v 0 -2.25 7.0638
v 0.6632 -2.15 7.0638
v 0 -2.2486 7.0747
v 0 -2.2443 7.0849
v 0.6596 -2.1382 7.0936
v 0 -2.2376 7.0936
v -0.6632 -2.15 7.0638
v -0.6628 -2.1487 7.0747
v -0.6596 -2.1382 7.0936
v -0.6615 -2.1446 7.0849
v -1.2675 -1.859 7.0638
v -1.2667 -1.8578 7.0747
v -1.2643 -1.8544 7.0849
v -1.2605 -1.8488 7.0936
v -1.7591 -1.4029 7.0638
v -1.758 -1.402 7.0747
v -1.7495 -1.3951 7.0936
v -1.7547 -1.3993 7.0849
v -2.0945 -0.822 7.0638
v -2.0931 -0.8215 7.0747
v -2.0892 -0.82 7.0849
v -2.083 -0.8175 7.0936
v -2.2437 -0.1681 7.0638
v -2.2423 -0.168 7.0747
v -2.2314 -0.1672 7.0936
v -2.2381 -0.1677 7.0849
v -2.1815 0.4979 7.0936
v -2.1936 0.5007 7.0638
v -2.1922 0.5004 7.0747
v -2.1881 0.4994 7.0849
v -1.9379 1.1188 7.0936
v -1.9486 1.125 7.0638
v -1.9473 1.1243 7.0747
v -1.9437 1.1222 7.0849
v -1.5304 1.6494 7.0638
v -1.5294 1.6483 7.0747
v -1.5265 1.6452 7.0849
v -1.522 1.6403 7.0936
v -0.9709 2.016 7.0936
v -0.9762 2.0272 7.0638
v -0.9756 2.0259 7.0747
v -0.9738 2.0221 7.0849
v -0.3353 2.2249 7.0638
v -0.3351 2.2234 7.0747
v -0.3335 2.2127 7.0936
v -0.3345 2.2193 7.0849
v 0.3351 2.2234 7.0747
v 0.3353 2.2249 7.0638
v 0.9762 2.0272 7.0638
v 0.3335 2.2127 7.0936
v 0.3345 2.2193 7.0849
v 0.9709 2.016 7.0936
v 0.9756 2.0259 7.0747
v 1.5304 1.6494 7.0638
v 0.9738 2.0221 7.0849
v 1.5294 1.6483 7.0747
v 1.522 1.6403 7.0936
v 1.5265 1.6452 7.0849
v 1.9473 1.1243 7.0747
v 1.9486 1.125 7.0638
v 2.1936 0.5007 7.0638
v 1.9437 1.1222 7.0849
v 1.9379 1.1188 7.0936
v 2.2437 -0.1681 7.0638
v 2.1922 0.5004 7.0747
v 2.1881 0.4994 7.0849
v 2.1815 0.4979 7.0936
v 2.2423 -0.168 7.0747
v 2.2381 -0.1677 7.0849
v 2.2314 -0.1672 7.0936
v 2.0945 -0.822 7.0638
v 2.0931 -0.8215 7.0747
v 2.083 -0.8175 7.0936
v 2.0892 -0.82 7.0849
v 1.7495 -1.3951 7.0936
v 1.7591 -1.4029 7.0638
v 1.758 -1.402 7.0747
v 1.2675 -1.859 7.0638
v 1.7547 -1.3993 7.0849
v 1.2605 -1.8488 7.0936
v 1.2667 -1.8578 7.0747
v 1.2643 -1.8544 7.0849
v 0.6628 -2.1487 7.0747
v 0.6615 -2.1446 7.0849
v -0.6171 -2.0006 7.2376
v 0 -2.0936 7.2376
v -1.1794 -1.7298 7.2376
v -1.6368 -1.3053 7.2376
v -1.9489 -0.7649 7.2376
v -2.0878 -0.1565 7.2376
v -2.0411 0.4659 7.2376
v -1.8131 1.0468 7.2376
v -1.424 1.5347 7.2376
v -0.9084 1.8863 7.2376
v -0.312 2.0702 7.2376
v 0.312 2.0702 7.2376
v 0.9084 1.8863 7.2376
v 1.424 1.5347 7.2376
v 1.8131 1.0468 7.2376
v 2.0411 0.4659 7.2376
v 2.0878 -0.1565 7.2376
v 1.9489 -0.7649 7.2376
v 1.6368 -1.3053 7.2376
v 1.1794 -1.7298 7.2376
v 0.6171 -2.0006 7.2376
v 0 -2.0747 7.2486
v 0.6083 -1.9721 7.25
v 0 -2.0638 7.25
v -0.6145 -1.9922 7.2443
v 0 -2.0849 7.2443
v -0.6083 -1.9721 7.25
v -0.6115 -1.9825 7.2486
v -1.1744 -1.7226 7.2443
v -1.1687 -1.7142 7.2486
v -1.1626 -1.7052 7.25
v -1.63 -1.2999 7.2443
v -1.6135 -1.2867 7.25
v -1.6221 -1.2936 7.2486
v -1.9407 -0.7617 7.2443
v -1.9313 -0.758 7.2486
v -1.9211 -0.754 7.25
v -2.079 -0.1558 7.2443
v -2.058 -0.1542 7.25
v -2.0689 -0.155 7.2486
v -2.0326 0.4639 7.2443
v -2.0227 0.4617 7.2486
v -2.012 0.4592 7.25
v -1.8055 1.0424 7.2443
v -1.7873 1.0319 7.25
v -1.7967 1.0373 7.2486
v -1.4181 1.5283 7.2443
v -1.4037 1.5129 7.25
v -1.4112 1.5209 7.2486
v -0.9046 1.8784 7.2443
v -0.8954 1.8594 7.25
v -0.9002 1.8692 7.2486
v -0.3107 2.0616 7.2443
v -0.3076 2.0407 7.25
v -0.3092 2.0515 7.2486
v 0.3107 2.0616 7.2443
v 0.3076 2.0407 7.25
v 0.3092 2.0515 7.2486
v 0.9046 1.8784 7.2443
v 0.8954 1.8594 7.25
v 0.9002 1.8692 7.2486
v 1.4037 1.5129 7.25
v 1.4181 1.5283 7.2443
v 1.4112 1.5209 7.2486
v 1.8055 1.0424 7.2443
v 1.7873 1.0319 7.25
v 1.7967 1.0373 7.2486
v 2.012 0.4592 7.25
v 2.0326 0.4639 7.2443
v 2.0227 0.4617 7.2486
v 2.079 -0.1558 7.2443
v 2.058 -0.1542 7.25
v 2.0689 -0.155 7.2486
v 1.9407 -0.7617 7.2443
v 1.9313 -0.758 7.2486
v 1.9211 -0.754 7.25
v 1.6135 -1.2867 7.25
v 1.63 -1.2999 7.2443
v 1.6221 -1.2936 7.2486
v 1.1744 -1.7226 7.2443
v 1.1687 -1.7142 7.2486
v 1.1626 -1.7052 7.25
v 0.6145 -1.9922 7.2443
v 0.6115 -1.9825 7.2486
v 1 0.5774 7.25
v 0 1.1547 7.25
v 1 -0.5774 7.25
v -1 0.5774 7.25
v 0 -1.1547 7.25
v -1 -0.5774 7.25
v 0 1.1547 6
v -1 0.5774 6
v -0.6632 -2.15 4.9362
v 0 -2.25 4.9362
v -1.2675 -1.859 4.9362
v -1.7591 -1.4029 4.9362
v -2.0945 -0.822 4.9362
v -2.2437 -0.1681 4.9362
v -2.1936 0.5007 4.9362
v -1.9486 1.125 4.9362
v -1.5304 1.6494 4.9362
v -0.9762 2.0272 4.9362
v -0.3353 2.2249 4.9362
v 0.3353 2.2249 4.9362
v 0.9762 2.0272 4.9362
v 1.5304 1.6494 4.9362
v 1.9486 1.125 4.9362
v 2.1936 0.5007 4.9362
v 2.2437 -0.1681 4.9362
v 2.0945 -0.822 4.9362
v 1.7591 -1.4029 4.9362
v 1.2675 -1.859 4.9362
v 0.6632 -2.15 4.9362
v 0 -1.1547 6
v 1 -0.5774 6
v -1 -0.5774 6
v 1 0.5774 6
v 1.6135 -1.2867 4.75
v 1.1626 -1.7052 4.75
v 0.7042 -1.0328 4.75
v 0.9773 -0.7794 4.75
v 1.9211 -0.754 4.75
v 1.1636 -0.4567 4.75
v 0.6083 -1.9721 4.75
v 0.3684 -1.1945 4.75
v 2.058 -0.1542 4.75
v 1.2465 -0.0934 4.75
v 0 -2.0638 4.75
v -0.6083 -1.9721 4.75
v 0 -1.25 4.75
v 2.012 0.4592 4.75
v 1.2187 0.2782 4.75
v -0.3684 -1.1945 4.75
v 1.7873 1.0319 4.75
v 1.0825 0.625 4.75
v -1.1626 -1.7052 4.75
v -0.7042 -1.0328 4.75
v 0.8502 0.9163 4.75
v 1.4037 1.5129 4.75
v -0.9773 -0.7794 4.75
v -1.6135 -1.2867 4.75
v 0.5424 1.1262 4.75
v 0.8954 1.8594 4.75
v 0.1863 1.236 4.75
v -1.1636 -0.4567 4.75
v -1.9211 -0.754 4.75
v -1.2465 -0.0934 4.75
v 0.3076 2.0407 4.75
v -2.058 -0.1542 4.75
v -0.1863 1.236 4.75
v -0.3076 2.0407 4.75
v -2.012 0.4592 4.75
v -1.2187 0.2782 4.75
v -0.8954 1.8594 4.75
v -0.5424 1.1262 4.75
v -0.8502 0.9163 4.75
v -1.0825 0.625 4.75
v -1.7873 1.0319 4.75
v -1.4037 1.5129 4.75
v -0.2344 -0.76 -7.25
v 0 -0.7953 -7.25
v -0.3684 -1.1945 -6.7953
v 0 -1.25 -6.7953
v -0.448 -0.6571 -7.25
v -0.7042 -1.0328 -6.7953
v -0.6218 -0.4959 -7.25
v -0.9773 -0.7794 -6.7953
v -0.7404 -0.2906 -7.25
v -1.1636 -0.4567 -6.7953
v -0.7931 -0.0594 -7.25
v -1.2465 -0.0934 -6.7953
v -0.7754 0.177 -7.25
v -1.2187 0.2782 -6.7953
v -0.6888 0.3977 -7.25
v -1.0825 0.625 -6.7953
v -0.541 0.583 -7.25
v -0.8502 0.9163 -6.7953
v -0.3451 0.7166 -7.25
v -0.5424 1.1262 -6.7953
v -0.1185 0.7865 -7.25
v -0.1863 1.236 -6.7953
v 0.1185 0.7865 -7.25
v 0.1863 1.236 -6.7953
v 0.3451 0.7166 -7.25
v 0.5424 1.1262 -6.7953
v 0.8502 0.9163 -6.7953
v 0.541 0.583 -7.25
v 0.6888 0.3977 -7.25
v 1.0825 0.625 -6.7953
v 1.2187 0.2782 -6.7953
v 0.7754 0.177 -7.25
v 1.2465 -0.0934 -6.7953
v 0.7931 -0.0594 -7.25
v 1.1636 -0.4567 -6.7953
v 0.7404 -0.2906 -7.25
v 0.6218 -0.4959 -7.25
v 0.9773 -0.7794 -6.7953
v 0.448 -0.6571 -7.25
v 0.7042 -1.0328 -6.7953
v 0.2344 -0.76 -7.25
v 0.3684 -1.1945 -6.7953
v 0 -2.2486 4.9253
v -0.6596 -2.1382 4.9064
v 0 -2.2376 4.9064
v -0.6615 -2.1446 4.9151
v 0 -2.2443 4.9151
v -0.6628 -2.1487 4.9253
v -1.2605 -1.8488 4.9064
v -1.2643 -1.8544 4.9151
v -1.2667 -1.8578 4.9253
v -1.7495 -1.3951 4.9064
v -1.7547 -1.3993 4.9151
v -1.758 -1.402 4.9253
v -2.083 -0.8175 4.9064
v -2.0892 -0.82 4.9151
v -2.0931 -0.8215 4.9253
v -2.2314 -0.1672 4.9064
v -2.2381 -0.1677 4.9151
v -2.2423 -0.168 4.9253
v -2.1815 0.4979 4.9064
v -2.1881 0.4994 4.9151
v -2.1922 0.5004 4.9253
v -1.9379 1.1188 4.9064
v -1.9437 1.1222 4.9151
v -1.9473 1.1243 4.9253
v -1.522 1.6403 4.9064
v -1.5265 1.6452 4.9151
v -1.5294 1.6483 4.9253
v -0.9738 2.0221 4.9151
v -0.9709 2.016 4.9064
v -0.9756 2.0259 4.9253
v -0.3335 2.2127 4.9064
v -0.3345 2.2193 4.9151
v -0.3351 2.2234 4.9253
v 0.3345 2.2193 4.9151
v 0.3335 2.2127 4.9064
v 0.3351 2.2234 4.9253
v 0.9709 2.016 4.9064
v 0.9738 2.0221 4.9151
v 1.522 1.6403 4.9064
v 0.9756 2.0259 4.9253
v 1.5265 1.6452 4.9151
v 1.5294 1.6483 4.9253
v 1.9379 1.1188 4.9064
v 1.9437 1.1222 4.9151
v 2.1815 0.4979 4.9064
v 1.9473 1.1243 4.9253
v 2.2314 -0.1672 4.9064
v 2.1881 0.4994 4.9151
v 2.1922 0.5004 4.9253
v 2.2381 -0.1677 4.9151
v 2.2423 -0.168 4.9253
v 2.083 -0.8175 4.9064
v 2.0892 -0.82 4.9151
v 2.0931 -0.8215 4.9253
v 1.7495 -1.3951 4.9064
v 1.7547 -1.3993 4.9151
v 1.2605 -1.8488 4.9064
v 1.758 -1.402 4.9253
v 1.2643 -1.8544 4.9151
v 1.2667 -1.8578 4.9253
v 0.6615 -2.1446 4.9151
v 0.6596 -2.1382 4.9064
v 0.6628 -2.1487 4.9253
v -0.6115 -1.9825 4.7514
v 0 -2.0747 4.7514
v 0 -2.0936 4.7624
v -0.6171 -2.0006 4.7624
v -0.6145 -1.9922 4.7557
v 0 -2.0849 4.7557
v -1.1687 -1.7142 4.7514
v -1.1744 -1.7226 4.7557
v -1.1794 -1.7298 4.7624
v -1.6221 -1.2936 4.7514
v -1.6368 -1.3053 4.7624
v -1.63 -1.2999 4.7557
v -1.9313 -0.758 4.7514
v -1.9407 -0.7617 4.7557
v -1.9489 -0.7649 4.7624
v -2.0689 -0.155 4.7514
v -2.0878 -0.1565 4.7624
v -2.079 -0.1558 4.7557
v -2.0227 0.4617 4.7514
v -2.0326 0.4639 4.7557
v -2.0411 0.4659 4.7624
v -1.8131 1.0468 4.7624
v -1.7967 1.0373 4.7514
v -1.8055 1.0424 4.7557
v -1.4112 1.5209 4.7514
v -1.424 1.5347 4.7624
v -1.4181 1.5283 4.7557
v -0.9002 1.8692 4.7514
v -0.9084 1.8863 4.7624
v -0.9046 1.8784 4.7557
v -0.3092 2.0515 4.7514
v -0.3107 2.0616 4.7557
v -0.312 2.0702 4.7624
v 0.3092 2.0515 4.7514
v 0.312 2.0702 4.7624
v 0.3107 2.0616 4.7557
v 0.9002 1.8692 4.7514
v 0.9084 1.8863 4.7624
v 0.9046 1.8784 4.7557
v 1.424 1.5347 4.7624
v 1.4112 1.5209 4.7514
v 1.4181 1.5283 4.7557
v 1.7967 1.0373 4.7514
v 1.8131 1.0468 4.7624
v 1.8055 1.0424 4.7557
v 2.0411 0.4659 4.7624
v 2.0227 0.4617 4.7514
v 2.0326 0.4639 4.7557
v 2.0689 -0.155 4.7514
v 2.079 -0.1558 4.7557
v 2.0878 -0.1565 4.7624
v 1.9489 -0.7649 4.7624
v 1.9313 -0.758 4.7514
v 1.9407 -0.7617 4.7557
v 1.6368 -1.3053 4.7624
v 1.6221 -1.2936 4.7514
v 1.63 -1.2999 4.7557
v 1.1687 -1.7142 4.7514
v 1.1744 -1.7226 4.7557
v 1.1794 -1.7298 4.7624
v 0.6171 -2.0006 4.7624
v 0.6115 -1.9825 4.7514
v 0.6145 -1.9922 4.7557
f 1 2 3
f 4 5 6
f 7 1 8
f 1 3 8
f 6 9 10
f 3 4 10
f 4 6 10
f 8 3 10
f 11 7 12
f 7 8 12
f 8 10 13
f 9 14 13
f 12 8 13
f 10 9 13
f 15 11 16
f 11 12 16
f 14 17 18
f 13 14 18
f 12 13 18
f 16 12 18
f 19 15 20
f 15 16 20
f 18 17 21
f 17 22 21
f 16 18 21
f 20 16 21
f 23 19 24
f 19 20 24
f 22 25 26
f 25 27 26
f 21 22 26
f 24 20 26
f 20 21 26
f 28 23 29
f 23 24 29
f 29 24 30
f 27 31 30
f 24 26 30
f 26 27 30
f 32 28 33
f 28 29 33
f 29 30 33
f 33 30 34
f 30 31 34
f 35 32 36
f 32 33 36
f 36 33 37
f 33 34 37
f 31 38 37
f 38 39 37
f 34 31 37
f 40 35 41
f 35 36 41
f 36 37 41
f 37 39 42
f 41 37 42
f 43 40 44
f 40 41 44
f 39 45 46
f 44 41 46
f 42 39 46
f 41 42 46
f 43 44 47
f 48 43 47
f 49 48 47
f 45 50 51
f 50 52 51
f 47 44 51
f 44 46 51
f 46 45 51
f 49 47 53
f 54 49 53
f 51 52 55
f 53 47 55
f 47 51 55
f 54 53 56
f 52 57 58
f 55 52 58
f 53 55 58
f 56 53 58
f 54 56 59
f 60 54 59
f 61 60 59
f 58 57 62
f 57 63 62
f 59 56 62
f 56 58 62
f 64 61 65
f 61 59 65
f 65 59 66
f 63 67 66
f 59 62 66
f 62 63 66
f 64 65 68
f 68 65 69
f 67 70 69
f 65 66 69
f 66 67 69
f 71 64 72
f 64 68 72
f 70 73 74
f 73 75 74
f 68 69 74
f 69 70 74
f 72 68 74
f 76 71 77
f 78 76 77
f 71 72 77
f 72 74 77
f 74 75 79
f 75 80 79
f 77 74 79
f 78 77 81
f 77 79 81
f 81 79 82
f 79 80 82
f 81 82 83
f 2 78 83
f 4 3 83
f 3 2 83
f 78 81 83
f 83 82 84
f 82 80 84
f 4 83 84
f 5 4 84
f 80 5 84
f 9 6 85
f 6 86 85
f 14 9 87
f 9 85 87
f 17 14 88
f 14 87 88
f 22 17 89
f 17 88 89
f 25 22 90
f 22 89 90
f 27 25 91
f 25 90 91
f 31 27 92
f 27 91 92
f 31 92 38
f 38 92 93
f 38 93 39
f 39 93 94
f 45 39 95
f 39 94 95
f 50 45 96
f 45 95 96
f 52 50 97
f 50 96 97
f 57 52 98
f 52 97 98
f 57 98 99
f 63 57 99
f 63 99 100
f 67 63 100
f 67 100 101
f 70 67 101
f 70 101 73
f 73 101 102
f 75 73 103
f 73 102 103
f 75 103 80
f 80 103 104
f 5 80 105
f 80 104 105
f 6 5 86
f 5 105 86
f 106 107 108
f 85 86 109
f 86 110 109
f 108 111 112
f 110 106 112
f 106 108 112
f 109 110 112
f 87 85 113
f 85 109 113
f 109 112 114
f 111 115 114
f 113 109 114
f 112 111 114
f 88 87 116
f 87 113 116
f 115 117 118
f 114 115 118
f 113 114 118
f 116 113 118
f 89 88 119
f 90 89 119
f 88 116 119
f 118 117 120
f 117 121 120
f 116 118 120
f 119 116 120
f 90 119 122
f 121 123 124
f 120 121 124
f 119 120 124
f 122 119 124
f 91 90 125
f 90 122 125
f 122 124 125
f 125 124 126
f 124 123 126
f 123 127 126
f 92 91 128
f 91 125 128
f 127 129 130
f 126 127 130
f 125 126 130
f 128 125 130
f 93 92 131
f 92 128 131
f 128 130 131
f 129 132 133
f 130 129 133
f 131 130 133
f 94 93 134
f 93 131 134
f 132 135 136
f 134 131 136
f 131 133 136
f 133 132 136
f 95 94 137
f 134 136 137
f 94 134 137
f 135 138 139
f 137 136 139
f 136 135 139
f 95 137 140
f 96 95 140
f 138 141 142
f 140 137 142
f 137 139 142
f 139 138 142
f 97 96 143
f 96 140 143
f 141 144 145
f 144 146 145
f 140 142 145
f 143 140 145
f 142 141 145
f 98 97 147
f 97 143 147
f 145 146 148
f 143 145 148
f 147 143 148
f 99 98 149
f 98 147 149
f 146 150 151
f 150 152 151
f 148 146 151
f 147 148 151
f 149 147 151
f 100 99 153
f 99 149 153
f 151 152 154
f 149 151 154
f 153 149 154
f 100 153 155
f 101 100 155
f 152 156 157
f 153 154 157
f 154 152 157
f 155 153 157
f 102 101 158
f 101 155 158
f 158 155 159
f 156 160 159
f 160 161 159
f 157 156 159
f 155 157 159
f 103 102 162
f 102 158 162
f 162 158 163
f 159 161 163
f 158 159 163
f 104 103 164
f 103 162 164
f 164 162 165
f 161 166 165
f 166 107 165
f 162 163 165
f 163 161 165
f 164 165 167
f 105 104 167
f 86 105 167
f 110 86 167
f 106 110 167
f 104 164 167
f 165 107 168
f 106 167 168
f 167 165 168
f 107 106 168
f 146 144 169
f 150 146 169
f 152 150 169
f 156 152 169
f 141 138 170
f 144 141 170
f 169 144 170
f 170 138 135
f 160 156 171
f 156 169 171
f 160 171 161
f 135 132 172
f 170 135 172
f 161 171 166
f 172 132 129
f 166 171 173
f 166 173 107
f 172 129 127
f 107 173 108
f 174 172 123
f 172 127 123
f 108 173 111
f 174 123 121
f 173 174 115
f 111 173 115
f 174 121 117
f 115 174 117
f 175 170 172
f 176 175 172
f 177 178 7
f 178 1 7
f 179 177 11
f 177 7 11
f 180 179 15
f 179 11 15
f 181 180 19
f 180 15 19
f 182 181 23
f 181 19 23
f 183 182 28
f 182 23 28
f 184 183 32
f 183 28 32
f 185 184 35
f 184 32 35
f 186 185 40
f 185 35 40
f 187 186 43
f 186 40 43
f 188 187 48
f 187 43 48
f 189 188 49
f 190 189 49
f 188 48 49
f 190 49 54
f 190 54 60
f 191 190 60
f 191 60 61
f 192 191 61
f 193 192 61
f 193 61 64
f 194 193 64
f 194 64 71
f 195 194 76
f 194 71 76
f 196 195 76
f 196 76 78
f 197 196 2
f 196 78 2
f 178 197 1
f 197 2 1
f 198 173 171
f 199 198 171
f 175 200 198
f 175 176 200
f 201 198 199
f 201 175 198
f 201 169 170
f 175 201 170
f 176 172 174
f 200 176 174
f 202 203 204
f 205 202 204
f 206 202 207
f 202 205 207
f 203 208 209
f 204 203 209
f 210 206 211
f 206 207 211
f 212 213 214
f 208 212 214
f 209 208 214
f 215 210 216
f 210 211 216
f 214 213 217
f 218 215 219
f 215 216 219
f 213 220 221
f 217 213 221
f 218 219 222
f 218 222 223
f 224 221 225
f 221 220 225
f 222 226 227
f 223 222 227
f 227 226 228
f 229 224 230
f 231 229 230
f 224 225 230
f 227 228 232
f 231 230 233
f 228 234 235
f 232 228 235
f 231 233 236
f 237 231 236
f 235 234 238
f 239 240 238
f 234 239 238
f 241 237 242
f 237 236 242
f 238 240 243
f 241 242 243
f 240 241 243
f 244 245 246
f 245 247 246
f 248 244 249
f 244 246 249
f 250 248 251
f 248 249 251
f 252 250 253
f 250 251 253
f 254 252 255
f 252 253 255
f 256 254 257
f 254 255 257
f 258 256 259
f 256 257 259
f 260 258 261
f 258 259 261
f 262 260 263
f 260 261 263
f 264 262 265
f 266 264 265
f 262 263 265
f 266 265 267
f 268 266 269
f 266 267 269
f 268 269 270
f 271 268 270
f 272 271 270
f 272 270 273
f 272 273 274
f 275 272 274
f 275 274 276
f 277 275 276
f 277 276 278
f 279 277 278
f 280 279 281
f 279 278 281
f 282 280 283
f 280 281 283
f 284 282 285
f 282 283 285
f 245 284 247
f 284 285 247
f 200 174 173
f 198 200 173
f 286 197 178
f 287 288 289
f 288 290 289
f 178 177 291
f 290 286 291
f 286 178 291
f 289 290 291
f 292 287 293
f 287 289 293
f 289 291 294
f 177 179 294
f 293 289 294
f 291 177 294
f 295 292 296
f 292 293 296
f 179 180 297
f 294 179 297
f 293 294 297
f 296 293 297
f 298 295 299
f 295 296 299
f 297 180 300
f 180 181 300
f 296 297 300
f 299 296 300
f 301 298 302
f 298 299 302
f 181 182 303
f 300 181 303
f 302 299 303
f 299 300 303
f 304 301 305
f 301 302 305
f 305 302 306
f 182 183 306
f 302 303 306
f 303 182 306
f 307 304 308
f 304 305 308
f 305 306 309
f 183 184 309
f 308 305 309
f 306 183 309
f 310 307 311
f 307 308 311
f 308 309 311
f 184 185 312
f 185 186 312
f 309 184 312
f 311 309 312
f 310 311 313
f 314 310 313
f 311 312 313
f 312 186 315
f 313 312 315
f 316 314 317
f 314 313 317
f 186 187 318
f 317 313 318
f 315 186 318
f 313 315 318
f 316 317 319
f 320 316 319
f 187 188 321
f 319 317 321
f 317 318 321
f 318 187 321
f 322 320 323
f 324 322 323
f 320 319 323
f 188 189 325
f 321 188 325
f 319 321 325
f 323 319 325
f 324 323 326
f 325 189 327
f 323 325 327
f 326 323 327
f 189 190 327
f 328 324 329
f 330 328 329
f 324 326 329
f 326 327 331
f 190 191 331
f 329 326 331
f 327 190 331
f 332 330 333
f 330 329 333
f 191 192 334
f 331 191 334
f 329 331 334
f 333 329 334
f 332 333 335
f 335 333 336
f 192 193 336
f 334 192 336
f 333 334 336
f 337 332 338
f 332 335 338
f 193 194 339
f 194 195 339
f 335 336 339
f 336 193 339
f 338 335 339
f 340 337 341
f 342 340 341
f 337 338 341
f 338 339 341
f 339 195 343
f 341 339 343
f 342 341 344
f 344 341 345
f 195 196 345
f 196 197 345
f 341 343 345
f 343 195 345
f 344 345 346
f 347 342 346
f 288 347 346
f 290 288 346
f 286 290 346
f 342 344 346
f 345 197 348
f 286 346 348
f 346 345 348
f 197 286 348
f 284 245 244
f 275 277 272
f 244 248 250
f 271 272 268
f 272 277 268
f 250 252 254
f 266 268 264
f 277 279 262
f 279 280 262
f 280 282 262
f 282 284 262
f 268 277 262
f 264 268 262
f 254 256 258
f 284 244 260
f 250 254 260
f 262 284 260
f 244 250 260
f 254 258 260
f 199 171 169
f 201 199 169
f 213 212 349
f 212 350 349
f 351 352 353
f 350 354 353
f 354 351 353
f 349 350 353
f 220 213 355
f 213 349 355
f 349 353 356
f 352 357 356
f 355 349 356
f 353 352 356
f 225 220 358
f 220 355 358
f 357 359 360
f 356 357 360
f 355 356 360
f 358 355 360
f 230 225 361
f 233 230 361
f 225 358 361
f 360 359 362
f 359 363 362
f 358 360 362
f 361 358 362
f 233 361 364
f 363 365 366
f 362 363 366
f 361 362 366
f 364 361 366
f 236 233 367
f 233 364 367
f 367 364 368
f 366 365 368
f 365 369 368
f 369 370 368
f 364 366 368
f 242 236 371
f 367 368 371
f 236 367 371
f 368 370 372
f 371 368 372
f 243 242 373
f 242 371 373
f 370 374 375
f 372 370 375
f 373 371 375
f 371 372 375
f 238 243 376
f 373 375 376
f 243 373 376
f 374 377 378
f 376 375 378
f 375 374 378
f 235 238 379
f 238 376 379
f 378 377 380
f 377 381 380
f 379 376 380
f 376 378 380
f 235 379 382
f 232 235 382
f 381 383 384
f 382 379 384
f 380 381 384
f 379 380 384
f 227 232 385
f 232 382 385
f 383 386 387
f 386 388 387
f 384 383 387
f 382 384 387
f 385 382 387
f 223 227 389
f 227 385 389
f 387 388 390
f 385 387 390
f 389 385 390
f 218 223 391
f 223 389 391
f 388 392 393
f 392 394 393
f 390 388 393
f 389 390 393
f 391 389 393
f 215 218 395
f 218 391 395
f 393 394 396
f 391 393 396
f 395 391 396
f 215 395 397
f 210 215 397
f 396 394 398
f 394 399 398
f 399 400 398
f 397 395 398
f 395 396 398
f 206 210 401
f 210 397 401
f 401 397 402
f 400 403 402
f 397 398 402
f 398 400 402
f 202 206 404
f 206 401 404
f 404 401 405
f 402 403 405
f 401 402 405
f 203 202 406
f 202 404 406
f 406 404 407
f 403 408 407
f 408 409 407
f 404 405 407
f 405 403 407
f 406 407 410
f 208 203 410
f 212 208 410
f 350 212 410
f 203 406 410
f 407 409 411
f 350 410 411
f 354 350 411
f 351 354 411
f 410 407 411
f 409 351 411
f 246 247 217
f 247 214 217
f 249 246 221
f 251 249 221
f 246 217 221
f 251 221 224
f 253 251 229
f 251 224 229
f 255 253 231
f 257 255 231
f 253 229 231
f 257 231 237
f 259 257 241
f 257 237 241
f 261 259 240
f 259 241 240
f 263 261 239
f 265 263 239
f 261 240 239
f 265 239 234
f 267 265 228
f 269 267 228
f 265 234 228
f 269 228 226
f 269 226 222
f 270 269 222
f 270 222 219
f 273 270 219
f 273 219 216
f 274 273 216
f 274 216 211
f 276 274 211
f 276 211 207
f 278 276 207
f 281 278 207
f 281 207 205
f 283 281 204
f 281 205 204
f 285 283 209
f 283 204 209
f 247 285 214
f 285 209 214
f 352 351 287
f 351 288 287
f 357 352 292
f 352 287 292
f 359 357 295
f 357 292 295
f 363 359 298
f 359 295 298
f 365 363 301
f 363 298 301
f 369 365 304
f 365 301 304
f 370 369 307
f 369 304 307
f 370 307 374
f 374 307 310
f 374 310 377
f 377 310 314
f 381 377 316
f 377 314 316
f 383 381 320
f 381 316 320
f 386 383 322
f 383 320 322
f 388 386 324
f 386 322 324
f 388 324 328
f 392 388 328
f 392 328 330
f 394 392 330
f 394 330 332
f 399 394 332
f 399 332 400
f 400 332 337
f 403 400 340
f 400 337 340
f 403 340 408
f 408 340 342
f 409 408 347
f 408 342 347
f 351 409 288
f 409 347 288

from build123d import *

# Parameters (mm, degrees)
CUT_EXTRUDE1_DEPTH = 1.25


with BuildPart() as part:
    # Sketch3 → Revolve1 (revolve)
    with BuildSketch(Plane(origin=(0, 0, 0), x_dir=(0, 0, -1), z_dir=(1, 0, 0)), mode=Mode.PRIVATE) as revolve1_sk:
        with BuildLine():
            Line((-7.25, 2.063775365), (-7.25, 1))
            Line((-7.25, 1), (-6, 1))
            Line((-6, 1), (-6, 0))
            Line((-6, 0), (7.25, 0))
            Line((7.25, 0), (7.25, 0.795336663))
            Line((7.25, 0.795336663), (6.795336663, 1.25))
            Line((6.795336663, 1.25), (-4.75, 1.25))
            Line((-4.75, 1.25), (-4.75, 2.063775365))
            ThreePointArc((-4.75, 2.063775365), (-4.753211332, 2.079919823), (-4.762356433, 2.093606433))
            Line((-4.762356433, 2.093606433), (-4.906393567, 2.237643567))
            ThreePointArc((-4.906393567, 2.237643567), (-4.920080177, 2.246788668), (-4.936224635, 2.25))
            Line((-4.936224635, 2.25), (-7.063775365, 2.25))
            ThreePointArc((-7.063775365, 2.25), (-7.079919823, 2.246788668), (-7.093606433, 2.237643567))
            Line((-7.093606433, 2.237643567), (-7.237643567, 2.093606433))
            ThreePointArc((-7.237643567, 2.093606433), (-7.246788668, 2.079919823), (-7.25, 2.063775365))
        make_face()
    revolve(revolve1_sk.sketch.rotate(Axis((0, 0, 7.25), (0, 0, -1)), 180), axis=Axis((0, 0, 7.25), (0, 0, -1)))

    # Sketch4 → Cut-Extrude1 (cut)
    with BuildSketch(Plane.XY.offset(7.25)):
        Polygon((0, 1.154700538), (-1, 0.577350269), (-1, -0.577350269), (0, -1.154700538), (1, -0.577350269), (1, 0.577350269), align=None)
    extrude(amount=-CUT_EXTRUDE1_DEPTH, mode=Mode.SUBTRACT)


solid = part.part
